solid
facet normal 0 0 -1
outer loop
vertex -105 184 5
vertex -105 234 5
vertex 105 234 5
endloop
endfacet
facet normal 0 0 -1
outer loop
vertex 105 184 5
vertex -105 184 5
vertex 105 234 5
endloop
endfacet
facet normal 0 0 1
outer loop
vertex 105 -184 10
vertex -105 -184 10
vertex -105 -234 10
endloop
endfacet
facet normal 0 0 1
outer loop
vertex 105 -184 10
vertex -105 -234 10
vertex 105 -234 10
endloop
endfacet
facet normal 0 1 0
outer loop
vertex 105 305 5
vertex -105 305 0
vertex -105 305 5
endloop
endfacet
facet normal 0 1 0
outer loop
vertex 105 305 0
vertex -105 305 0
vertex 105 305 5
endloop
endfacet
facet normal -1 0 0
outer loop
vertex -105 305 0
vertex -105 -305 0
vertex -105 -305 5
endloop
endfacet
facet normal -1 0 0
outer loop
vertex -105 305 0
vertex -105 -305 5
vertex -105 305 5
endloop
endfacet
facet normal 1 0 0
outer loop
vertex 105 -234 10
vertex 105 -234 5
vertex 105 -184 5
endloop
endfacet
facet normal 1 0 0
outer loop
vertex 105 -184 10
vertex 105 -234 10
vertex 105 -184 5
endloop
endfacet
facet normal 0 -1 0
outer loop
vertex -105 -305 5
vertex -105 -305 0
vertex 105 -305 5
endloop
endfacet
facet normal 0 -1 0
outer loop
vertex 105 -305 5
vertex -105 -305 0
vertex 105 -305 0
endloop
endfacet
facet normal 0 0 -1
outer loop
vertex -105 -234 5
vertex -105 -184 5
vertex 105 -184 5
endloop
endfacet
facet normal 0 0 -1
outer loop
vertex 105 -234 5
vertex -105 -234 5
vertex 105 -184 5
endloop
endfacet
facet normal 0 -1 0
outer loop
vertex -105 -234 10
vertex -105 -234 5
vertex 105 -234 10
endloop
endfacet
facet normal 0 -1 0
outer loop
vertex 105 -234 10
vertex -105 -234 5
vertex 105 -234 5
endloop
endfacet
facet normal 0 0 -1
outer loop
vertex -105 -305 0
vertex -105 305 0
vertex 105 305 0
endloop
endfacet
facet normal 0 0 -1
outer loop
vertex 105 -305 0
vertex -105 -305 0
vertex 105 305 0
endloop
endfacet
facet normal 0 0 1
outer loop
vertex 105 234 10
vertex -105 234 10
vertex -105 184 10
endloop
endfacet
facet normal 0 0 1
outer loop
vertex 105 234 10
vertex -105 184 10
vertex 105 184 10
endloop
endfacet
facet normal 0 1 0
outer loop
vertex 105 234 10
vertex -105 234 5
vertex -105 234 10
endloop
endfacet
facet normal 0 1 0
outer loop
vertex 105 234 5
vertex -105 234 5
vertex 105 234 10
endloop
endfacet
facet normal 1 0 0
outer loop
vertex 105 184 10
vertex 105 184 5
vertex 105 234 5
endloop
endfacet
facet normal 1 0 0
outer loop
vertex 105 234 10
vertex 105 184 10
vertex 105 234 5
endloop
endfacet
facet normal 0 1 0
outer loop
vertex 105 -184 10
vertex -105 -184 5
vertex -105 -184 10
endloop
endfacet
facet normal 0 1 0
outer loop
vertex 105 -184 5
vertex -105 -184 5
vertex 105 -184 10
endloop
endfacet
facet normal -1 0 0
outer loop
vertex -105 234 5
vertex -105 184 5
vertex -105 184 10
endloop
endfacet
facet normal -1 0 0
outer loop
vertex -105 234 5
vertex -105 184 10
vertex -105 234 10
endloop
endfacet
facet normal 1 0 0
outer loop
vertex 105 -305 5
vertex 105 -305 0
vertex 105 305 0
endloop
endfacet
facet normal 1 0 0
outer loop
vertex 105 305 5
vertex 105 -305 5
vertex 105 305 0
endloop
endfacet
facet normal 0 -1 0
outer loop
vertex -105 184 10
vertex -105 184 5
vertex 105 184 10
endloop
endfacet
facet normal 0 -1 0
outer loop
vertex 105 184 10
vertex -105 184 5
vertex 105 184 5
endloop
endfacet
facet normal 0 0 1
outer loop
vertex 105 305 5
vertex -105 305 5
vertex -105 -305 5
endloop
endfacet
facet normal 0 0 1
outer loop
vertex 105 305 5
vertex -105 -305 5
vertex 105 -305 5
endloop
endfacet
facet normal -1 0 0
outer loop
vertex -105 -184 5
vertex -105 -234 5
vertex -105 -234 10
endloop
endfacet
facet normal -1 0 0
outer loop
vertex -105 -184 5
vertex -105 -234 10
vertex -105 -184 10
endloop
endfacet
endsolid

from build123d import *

# Parameters (mm, degrees)
F1_W     = 210
F1_H     = 610
F2_DEPTH = 5
F3_W     = 210
F3_H     = 50
F4_DEPTH = 5


with BuildPart() as f2:
    # F1 (on Top) → F2 (new body)
    with BuildSketch(Plane.XY):
        Rectangle(F1_W, F1_H)
    extrude(amount=F2_DEPTH)


with BuildPart() as f4:
    # F3 (on face) → F4 (new body)
    with BuildSketch(Plane.XY.offset(5)):
        with Locations((0, -209)):
            Rectangle(F3_W, F3_H)
    extrude(amount=F4_DEPTH)


with BuildPart() as f4b:
    # F3 (on face) → F4, piece 2 (new body)
    with BuildSketch(Plane.XY.offset(5)):
        with Locations((0, 209)):
            Rectangle(F3_W, F3_H)
    extrude(amount=F4_DEPTH)


solid = Compound([f2.part, f4.part, f4b.part])
